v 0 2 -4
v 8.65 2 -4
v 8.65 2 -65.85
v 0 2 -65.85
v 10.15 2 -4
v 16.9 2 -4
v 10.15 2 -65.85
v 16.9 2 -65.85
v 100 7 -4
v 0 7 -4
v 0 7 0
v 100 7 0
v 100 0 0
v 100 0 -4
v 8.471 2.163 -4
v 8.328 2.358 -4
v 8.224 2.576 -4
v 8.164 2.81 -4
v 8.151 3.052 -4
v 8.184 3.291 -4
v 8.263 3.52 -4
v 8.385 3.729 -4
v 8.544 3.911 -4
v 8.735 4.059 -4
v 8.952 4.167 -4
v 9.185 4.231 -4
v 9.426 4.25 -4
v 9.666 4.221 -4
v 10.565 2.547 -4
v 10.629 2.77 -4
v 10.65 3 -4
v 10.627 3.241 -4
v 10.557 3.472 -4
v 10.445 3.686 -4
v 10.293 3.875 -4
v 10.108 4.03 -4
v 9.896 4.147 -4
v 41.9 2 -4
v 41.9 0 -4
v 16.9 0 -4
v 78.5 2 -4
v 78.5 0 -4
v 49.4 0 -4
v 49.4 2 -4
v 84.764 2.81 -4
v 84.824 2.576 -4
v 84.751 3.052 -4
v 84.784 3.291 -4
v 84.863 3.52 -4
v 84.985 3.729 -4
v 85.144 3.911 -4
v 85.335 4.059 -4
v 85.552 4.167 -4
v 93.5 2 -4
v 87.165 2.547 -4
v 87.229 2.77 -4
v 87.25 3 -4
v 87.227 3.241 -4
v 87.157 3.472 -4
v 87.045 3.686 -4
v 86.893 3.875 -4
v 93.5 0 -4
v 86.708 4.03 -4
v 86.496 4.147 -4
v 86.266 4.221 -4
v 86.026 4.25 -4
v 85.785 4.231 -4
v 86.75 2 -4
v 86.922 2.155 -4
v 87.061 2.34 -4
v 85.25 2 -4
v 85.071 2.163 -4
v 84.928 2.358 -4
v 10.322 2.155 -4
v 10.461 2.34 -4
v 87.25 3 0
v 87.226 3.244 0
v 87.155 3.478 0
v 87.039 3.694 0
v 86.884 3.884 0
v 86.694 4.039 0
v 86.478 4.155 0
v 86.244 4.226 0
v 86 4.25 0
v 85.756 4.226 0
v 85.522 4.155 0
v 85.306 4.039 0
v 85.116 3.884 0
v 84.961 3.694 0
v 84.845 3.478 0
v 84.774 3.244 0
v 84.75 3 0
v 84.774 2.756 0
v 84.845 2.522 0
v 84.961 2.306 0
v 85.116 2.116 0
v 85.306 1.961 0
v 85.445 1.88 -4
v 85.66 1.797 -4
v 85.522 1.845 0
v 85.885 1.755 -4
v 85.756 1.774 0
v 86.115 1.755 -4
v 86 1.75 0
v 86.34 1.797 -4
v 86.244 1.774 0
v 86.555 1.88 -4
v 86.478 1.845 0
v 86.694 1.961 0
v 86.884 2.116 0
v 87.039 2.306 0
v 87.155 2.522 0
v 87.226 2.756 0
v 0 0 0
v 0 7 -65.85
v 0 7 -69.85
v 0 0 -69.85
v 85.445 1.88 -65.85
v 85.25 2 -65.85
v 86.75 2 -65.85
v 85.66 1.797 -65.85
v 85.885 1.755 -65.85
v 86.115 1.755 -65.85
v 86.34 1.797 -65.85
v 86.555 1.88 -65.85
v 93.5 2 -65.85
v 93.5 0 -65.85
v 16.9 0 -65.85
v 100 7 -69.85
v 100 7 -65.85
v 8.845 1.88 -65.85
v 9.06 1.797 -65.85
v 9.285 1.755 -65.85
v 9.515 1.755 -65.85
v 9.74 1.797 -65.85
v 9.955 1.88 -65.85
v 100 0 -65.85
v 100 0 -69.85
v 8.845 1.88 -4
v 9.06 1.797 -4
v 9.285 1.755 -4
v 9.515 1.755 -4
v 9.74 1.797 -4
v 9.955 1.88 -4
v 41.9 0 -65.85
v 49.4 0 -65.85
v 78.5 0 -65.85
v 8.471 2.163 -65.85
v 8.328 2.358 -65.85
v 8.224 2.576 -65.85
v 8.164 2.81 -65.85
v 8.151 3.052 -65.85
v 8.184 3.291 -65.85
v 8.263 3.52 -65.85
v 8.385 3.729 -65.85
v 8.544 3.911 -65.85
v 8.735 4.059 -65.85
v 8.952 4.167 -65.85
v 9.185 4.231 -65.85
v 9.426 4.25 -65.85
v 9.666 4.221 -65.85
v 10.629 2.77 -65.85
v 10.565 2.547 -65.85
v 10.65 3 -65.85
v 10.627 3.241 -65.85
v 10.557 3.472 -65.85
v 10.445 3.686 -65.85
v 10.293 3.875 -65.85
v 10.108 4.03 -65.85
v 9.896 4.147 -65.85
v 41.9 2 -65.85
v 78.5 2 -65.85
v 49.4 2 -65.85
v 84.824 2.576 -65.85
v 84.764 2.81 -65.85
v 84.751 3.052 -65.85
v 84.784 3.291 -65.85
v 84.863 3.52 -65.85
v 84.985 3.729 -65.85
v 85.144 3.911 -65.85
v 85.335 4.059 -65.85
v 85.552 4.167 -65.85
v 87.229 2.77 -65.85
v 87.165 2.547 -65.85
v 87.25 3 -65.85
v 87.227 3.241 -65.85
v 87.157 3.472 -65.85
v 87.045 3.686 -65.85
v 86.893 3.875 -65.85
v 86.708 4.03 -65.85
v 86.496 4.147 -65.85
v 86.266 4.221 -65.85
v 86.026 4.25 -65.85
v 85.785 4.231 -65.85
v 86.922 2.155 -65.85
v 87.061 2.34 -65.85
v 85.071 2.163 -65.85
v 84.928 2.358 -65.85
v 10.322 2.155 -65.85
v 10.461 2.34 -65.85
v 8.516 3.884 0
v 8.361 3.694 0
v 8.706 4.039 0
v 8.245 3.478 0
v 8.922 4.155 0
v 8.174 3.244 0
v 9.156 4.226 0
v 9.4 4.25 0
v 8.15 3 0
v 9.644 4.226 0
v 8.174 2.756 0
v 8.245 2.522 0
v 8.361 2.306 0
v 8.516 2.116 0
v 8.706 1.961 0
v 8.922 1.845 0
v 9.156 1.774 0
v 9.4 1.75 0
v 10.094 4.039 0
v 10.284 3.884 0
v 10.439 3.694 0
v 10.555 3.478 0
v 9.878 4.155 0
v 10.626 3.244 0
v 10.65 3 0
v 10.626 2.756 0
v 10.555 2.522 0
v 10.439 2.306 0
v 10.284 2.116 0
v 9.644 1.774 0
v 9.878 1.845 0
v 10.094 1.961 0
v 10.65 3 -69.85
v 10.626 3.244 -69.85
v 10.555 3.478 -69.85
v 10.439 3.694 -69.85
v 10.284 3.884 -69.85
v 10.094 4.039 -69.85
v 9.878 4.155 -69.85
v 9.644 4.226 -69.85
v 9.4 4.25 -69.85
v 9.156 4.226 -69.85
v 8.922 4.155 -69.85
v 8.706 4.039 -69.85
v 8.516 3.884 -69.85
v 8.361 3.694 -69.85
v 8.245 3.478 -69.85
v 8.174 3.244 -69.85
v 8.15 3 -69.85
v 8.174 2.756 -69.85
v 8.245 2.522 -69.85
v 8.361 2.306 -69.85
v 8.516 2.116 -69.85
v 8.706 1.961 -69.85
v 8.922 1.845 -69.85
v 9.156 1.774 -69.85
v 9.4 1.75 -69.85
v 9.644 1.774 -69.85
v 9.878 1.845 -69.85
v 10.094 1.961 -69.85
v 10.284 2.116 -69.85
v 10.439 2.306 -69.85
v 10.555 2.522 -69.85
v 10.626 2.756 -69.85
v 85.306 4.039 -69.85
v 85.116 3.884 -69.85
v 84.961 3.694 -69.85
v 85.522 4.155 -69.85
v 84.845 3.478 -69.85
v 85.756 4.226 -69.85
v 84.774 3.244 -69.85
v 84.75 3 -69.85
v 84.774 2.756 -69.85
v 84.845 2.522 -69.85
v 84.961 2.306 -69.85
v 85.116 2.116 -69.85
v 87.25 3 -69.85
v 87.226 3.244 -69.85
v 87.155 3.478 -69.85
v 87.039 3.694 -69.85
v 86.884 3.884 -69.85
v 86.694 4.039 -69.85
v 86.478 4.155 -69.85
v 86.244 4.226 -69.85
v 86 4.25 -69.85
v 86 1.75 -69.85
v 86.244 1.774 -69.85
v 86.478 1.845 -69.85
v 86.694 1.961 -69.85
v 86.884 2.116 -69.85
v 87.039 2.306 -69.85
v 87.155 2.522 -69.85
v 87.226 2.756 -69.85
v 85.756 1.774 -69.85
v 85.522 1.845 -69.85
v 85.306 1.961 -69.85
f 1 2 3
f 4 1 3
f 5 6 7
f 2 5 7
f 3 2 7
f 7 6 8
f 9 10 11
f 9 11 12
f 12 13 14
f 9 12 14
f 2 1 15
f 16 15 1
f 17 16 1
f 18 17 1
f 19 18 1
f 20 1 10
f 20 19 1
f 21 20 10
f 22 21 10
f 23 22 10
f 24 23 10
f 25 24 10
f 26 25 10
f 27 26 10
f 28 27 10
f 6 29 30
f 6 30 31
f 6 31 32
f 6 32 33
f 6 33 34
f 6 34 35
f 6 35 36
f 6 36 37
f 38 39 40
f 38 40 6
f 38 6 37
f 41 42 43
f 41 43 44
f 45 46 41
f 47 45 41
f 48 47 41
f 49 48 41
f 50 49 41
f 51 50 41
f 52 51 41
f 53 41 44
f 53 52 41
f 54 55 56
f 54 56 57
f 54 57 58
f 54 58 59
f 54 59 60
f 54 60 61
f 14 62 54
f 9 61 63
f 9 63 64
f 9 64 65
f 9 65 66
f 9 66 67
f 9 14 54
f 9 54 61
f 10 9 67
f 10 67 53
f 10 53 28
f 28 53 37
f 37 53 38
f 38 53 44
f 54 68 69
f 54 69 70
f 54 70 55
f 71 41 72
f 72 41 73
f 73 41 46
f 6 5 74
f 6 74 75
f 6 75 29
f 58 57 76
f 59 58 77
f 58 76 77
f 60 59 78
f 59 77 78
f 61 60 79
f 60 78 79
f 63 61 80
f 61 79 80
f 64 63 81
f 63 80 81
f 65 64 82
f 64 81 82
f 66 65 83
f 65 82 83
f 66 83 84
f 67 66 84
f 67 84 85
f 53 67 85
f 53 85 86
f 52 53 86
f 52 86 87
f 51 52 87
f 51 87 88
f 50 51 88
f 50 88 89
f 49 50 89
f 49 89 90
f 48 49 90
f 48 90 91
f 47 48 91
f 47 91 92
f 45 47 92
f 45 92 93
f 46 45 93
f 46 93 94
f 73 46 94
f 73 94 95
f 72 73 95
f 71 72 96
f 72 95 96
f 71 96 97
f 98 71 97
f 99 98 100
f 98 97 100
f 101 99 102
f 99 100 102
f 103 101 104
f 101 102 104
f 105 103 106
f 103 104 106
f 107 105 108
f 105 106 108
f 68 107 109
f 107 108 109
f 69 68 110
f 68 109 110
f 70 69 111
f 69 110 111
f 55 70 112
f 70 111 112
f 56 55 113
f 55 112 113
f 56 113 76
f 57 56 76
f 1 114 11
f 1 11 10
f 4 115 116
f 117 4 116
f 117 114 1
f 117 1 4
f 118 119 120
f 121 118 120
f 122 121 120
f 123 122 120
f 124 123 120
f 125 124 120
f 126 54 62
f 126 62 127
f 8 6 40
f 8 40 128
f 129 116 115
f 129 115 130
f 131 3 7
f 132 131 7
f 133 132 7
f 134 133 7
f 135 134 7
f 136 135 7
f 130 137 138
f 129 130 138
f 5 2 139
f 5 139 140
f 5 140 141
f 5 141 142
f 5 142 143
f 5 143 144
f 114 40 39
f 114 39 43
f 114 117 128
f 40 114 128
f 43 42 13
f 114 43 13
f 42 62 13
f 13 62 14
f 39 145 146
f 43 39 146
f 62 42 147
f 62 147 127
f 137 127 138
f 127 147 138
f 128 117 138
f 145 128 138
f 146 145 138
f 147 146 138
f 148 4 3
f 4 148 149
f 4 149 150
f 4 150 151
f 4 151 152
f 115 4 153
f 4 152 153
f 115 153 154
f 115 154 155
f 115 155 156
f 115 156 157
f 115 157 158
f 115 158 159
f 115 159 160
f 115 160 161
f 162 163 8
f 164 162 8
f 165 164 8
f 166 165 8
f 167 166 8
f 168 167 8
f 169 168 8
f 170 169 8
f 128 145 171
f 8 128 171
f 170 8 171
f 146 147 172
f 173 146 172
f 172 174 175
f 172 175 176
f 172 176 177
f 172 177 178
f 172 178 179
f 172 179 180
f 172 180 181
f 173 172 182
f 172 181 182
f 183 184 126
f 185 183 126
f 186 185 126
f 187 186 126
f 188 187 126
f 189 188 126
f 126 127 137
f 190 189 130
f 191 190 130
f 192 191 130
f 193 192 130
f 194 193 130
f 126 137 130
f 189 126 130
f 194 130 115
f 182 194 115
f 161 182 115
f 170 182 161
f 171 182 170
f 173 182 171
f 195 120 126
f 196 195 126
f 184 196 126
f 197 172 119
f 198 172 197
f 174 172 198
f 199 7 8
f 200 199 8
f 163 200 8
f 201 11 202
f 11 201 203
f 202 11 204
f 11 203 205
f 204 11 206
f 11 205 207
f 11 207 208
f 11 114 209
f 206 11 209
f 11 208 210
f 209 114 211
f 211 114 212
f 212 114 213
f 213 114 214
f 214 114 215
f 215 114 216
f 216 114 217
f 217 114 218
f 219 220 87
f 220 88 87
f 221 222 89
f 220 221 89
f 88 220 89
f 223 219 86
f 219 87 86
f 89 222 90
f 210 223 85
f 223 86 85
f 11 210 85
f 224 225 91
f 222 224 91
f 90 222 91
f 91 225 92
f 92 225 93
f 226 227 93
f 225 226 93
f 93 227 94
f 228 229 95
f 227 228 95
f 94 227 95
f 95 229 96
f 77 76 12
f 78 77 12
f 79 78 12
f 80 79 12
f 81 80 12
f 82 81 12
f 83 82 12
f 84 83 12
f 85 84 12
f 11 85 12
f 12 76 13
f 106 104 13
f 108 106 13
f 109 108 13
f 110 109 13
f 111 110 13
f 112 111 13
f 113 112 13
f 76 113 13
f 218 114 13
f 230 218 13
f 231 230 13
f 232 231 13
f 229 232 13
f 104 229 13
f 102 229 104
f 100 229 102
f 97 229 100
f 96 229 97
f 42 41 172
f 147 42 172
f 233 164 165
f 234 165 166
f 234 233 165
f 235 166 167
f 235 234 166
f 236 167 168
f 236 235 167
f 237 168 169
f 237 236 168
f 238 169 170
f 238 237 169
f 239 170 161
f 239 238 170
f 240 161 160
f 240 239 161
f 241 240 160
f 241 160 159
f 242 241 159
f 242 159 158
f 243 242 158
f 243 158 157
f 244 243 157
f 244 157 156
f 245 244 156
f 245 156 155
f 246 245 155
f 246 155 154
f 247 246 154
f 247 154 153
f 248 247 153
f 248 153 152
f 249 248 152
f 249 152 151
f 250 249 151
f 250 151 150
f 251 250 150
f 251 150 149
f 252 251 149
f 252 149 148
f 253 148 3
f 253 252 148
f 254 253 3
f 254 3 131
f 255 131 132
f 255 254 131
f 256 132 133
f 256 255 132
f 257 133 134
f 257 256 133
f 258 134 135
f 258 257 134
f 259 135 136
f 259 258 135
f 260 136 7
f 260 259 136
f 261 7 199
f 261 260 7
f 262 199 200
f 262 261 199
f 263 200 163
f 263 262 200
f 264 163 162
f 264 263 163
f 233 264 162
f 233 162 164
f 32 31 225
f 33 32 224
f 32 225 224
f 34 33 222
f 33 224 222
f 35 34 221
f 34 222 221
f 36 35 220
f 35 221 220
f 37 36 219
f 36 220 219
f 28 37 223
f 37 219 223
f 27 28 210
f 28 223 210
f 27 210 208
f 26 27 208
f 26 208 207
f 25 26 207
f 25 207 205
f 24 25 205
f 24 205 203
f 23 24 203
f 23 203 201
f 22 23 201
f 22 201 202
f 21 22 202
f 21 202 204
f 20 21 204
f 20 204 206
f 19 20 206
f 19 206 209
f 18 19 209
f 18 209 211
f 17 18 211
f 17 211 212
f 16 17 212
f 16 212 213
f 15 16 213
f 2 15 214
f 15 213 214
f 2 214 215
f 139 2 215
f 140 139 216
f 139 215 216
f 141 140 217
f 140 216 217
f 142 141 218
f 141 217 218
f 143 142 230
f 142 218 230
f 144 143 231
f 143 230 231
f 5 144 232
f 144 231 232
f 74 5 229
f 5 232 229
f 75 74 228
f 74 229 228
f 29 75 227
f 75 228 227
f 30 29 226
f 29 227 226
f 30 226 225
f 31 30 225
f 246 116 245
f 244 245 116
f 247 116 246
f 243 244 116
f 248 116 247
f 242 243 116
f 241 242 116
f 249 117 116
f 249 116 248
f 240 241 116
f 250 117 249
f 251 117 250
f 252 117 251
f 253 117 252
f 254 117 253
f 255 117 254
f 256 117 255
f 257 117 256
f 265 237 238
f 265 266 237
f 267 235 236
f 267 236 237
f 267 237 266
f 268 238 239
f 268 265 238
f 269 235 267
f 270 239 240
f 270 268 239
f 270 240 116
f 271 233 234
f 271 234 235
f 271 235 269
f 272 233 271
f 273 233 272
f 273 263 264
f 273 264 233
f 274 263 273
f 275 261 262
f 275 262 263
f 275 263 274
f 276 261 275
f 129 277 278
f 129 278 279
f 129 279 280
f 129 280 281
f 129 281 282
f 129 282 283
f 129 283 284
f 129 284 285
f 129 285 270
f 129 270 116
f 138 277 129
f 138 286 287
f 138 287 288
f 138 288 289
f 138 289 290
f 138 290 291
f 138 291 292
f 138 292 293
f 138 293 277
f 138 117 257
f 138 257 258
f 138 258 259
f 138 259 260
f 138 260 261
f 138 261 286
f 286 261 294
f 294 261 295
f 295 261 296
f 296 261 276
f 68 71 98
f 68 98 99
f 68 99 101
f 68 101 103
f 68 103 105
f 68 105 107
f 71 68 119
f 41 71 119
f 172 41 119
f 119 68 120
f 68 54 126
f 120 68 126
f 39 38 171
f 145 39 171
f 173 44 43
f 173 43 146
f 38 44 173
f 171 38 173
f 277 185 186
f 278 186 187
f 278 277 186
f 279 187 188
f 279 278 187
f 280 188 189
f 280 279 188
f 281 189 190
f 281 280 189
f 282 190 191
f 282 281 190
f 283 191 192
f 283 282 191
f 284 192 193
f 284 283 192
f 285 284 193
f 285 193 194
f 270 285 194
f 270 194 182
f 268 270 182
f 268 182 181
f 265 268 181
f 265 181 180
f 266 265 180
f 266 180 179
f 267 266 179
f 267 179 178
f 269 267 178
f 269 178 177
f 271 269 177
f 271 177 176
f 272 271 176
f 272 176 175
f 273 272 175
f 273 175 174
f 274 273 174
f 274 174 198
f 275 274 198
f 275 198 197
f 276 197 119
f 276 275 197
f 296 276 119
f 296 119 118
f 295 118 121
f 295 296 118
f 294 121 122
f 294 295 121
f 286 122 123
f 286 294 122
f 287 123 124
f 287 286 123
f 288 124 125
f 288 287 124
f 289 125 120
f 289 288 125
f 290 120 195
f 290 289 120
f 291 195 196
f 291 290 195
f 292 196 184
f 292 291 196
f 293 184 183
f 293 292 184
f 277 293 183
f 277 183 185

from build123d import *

# Parameters (mm, degrees)
SKETCH1_W           = 100
SKETCH1_H           = 69.85
BOSS_EXTRUDE1_DEPTH = 7
SKETCH2_R           = 1.25
CUT_EXTRUDE1_DEPTH  = 4
SKETCH3_W           = 25
SKETCH3_H           = 61.85
SKETCH3_W_2         = 29.1
SKETCH3_W_3         = 6.5
CUT_EXTRUDE2_DEPTH  = 8
SKETCH4_W           = 61.85
SKETCH4_H           = 5
CUT_EXTRUDE3_DEPTH  = 94.5


with BuildPart() as part:
    # Sketch1 → Boss-Extrude1 (new body)
    with BuildSketch(Plane(origin=(0, 0, 0), x_dir=(1, 0, 0), z_dir=(0, 1, 0))):
        with Locations((50, 34.925)):
            Rectangle(SKETCH1_W, SKETCH1_H)
    extrude(amount=BOSS_EXTRUDE1_DEPTH)

    # Sketch2 → Cut-Extrude1 (cut)
    with BuildSketch(Plane.XY):
        with Locations((86, 3)):
            Circle(SKETCH2_R)
        with Locations((9.4, 3)):
            Circle(SKETCH2_R)
    cut_extrude1 = extrude(amount=-CUT_EXTRUDE1_DEPTH, mode=Mode.SUBTRACT)

    # Sketch3 → Cut-Extrude2 (cut, through all)
    with BuildSketch(Plane(origin=(0, 7, 0), x_dir=(1, 0, 0), z_dir=(0, 1, 0))):
        with Locations((29.4, 34.925)):
            Rectangle(SKETCH3_W, SKETCH3_H)
        with Locations((63.95, 34.925)):
            Rectangle(SKETCH3_W_2, SKETCH3_H)
        with Locations((96.75, 34.925)):
            Rectangle(SKETCH3_W_3, SKETCH3_H)
    extrude(amount=-CUT_EXTRUDE2_DEPTH, mode=Mode.SUBTRACT)

    # Sketch4 → Cut-Extrude3 (cut, through all)
    with BuildSketch(Plane(origin=(93.5, 0, 0), x_dir=(0, 0, -1), z_dir=(1, 0, 0))):
        with Locations((34.925, 4.5)):
            Rectangle(SKETCH4_W, SKETCH4_H)
    extrude(amount=-CUT_EXTRUDE3_DEPTH, mode=Mode.SUBTRACT)

    # Mirror1: Cut-Extrude1 across plane
    add(cut_extrude1.mirror(Plane.XY.offset(-34.925)), mode=Mode.SUBTRACT)


solid = part.part
